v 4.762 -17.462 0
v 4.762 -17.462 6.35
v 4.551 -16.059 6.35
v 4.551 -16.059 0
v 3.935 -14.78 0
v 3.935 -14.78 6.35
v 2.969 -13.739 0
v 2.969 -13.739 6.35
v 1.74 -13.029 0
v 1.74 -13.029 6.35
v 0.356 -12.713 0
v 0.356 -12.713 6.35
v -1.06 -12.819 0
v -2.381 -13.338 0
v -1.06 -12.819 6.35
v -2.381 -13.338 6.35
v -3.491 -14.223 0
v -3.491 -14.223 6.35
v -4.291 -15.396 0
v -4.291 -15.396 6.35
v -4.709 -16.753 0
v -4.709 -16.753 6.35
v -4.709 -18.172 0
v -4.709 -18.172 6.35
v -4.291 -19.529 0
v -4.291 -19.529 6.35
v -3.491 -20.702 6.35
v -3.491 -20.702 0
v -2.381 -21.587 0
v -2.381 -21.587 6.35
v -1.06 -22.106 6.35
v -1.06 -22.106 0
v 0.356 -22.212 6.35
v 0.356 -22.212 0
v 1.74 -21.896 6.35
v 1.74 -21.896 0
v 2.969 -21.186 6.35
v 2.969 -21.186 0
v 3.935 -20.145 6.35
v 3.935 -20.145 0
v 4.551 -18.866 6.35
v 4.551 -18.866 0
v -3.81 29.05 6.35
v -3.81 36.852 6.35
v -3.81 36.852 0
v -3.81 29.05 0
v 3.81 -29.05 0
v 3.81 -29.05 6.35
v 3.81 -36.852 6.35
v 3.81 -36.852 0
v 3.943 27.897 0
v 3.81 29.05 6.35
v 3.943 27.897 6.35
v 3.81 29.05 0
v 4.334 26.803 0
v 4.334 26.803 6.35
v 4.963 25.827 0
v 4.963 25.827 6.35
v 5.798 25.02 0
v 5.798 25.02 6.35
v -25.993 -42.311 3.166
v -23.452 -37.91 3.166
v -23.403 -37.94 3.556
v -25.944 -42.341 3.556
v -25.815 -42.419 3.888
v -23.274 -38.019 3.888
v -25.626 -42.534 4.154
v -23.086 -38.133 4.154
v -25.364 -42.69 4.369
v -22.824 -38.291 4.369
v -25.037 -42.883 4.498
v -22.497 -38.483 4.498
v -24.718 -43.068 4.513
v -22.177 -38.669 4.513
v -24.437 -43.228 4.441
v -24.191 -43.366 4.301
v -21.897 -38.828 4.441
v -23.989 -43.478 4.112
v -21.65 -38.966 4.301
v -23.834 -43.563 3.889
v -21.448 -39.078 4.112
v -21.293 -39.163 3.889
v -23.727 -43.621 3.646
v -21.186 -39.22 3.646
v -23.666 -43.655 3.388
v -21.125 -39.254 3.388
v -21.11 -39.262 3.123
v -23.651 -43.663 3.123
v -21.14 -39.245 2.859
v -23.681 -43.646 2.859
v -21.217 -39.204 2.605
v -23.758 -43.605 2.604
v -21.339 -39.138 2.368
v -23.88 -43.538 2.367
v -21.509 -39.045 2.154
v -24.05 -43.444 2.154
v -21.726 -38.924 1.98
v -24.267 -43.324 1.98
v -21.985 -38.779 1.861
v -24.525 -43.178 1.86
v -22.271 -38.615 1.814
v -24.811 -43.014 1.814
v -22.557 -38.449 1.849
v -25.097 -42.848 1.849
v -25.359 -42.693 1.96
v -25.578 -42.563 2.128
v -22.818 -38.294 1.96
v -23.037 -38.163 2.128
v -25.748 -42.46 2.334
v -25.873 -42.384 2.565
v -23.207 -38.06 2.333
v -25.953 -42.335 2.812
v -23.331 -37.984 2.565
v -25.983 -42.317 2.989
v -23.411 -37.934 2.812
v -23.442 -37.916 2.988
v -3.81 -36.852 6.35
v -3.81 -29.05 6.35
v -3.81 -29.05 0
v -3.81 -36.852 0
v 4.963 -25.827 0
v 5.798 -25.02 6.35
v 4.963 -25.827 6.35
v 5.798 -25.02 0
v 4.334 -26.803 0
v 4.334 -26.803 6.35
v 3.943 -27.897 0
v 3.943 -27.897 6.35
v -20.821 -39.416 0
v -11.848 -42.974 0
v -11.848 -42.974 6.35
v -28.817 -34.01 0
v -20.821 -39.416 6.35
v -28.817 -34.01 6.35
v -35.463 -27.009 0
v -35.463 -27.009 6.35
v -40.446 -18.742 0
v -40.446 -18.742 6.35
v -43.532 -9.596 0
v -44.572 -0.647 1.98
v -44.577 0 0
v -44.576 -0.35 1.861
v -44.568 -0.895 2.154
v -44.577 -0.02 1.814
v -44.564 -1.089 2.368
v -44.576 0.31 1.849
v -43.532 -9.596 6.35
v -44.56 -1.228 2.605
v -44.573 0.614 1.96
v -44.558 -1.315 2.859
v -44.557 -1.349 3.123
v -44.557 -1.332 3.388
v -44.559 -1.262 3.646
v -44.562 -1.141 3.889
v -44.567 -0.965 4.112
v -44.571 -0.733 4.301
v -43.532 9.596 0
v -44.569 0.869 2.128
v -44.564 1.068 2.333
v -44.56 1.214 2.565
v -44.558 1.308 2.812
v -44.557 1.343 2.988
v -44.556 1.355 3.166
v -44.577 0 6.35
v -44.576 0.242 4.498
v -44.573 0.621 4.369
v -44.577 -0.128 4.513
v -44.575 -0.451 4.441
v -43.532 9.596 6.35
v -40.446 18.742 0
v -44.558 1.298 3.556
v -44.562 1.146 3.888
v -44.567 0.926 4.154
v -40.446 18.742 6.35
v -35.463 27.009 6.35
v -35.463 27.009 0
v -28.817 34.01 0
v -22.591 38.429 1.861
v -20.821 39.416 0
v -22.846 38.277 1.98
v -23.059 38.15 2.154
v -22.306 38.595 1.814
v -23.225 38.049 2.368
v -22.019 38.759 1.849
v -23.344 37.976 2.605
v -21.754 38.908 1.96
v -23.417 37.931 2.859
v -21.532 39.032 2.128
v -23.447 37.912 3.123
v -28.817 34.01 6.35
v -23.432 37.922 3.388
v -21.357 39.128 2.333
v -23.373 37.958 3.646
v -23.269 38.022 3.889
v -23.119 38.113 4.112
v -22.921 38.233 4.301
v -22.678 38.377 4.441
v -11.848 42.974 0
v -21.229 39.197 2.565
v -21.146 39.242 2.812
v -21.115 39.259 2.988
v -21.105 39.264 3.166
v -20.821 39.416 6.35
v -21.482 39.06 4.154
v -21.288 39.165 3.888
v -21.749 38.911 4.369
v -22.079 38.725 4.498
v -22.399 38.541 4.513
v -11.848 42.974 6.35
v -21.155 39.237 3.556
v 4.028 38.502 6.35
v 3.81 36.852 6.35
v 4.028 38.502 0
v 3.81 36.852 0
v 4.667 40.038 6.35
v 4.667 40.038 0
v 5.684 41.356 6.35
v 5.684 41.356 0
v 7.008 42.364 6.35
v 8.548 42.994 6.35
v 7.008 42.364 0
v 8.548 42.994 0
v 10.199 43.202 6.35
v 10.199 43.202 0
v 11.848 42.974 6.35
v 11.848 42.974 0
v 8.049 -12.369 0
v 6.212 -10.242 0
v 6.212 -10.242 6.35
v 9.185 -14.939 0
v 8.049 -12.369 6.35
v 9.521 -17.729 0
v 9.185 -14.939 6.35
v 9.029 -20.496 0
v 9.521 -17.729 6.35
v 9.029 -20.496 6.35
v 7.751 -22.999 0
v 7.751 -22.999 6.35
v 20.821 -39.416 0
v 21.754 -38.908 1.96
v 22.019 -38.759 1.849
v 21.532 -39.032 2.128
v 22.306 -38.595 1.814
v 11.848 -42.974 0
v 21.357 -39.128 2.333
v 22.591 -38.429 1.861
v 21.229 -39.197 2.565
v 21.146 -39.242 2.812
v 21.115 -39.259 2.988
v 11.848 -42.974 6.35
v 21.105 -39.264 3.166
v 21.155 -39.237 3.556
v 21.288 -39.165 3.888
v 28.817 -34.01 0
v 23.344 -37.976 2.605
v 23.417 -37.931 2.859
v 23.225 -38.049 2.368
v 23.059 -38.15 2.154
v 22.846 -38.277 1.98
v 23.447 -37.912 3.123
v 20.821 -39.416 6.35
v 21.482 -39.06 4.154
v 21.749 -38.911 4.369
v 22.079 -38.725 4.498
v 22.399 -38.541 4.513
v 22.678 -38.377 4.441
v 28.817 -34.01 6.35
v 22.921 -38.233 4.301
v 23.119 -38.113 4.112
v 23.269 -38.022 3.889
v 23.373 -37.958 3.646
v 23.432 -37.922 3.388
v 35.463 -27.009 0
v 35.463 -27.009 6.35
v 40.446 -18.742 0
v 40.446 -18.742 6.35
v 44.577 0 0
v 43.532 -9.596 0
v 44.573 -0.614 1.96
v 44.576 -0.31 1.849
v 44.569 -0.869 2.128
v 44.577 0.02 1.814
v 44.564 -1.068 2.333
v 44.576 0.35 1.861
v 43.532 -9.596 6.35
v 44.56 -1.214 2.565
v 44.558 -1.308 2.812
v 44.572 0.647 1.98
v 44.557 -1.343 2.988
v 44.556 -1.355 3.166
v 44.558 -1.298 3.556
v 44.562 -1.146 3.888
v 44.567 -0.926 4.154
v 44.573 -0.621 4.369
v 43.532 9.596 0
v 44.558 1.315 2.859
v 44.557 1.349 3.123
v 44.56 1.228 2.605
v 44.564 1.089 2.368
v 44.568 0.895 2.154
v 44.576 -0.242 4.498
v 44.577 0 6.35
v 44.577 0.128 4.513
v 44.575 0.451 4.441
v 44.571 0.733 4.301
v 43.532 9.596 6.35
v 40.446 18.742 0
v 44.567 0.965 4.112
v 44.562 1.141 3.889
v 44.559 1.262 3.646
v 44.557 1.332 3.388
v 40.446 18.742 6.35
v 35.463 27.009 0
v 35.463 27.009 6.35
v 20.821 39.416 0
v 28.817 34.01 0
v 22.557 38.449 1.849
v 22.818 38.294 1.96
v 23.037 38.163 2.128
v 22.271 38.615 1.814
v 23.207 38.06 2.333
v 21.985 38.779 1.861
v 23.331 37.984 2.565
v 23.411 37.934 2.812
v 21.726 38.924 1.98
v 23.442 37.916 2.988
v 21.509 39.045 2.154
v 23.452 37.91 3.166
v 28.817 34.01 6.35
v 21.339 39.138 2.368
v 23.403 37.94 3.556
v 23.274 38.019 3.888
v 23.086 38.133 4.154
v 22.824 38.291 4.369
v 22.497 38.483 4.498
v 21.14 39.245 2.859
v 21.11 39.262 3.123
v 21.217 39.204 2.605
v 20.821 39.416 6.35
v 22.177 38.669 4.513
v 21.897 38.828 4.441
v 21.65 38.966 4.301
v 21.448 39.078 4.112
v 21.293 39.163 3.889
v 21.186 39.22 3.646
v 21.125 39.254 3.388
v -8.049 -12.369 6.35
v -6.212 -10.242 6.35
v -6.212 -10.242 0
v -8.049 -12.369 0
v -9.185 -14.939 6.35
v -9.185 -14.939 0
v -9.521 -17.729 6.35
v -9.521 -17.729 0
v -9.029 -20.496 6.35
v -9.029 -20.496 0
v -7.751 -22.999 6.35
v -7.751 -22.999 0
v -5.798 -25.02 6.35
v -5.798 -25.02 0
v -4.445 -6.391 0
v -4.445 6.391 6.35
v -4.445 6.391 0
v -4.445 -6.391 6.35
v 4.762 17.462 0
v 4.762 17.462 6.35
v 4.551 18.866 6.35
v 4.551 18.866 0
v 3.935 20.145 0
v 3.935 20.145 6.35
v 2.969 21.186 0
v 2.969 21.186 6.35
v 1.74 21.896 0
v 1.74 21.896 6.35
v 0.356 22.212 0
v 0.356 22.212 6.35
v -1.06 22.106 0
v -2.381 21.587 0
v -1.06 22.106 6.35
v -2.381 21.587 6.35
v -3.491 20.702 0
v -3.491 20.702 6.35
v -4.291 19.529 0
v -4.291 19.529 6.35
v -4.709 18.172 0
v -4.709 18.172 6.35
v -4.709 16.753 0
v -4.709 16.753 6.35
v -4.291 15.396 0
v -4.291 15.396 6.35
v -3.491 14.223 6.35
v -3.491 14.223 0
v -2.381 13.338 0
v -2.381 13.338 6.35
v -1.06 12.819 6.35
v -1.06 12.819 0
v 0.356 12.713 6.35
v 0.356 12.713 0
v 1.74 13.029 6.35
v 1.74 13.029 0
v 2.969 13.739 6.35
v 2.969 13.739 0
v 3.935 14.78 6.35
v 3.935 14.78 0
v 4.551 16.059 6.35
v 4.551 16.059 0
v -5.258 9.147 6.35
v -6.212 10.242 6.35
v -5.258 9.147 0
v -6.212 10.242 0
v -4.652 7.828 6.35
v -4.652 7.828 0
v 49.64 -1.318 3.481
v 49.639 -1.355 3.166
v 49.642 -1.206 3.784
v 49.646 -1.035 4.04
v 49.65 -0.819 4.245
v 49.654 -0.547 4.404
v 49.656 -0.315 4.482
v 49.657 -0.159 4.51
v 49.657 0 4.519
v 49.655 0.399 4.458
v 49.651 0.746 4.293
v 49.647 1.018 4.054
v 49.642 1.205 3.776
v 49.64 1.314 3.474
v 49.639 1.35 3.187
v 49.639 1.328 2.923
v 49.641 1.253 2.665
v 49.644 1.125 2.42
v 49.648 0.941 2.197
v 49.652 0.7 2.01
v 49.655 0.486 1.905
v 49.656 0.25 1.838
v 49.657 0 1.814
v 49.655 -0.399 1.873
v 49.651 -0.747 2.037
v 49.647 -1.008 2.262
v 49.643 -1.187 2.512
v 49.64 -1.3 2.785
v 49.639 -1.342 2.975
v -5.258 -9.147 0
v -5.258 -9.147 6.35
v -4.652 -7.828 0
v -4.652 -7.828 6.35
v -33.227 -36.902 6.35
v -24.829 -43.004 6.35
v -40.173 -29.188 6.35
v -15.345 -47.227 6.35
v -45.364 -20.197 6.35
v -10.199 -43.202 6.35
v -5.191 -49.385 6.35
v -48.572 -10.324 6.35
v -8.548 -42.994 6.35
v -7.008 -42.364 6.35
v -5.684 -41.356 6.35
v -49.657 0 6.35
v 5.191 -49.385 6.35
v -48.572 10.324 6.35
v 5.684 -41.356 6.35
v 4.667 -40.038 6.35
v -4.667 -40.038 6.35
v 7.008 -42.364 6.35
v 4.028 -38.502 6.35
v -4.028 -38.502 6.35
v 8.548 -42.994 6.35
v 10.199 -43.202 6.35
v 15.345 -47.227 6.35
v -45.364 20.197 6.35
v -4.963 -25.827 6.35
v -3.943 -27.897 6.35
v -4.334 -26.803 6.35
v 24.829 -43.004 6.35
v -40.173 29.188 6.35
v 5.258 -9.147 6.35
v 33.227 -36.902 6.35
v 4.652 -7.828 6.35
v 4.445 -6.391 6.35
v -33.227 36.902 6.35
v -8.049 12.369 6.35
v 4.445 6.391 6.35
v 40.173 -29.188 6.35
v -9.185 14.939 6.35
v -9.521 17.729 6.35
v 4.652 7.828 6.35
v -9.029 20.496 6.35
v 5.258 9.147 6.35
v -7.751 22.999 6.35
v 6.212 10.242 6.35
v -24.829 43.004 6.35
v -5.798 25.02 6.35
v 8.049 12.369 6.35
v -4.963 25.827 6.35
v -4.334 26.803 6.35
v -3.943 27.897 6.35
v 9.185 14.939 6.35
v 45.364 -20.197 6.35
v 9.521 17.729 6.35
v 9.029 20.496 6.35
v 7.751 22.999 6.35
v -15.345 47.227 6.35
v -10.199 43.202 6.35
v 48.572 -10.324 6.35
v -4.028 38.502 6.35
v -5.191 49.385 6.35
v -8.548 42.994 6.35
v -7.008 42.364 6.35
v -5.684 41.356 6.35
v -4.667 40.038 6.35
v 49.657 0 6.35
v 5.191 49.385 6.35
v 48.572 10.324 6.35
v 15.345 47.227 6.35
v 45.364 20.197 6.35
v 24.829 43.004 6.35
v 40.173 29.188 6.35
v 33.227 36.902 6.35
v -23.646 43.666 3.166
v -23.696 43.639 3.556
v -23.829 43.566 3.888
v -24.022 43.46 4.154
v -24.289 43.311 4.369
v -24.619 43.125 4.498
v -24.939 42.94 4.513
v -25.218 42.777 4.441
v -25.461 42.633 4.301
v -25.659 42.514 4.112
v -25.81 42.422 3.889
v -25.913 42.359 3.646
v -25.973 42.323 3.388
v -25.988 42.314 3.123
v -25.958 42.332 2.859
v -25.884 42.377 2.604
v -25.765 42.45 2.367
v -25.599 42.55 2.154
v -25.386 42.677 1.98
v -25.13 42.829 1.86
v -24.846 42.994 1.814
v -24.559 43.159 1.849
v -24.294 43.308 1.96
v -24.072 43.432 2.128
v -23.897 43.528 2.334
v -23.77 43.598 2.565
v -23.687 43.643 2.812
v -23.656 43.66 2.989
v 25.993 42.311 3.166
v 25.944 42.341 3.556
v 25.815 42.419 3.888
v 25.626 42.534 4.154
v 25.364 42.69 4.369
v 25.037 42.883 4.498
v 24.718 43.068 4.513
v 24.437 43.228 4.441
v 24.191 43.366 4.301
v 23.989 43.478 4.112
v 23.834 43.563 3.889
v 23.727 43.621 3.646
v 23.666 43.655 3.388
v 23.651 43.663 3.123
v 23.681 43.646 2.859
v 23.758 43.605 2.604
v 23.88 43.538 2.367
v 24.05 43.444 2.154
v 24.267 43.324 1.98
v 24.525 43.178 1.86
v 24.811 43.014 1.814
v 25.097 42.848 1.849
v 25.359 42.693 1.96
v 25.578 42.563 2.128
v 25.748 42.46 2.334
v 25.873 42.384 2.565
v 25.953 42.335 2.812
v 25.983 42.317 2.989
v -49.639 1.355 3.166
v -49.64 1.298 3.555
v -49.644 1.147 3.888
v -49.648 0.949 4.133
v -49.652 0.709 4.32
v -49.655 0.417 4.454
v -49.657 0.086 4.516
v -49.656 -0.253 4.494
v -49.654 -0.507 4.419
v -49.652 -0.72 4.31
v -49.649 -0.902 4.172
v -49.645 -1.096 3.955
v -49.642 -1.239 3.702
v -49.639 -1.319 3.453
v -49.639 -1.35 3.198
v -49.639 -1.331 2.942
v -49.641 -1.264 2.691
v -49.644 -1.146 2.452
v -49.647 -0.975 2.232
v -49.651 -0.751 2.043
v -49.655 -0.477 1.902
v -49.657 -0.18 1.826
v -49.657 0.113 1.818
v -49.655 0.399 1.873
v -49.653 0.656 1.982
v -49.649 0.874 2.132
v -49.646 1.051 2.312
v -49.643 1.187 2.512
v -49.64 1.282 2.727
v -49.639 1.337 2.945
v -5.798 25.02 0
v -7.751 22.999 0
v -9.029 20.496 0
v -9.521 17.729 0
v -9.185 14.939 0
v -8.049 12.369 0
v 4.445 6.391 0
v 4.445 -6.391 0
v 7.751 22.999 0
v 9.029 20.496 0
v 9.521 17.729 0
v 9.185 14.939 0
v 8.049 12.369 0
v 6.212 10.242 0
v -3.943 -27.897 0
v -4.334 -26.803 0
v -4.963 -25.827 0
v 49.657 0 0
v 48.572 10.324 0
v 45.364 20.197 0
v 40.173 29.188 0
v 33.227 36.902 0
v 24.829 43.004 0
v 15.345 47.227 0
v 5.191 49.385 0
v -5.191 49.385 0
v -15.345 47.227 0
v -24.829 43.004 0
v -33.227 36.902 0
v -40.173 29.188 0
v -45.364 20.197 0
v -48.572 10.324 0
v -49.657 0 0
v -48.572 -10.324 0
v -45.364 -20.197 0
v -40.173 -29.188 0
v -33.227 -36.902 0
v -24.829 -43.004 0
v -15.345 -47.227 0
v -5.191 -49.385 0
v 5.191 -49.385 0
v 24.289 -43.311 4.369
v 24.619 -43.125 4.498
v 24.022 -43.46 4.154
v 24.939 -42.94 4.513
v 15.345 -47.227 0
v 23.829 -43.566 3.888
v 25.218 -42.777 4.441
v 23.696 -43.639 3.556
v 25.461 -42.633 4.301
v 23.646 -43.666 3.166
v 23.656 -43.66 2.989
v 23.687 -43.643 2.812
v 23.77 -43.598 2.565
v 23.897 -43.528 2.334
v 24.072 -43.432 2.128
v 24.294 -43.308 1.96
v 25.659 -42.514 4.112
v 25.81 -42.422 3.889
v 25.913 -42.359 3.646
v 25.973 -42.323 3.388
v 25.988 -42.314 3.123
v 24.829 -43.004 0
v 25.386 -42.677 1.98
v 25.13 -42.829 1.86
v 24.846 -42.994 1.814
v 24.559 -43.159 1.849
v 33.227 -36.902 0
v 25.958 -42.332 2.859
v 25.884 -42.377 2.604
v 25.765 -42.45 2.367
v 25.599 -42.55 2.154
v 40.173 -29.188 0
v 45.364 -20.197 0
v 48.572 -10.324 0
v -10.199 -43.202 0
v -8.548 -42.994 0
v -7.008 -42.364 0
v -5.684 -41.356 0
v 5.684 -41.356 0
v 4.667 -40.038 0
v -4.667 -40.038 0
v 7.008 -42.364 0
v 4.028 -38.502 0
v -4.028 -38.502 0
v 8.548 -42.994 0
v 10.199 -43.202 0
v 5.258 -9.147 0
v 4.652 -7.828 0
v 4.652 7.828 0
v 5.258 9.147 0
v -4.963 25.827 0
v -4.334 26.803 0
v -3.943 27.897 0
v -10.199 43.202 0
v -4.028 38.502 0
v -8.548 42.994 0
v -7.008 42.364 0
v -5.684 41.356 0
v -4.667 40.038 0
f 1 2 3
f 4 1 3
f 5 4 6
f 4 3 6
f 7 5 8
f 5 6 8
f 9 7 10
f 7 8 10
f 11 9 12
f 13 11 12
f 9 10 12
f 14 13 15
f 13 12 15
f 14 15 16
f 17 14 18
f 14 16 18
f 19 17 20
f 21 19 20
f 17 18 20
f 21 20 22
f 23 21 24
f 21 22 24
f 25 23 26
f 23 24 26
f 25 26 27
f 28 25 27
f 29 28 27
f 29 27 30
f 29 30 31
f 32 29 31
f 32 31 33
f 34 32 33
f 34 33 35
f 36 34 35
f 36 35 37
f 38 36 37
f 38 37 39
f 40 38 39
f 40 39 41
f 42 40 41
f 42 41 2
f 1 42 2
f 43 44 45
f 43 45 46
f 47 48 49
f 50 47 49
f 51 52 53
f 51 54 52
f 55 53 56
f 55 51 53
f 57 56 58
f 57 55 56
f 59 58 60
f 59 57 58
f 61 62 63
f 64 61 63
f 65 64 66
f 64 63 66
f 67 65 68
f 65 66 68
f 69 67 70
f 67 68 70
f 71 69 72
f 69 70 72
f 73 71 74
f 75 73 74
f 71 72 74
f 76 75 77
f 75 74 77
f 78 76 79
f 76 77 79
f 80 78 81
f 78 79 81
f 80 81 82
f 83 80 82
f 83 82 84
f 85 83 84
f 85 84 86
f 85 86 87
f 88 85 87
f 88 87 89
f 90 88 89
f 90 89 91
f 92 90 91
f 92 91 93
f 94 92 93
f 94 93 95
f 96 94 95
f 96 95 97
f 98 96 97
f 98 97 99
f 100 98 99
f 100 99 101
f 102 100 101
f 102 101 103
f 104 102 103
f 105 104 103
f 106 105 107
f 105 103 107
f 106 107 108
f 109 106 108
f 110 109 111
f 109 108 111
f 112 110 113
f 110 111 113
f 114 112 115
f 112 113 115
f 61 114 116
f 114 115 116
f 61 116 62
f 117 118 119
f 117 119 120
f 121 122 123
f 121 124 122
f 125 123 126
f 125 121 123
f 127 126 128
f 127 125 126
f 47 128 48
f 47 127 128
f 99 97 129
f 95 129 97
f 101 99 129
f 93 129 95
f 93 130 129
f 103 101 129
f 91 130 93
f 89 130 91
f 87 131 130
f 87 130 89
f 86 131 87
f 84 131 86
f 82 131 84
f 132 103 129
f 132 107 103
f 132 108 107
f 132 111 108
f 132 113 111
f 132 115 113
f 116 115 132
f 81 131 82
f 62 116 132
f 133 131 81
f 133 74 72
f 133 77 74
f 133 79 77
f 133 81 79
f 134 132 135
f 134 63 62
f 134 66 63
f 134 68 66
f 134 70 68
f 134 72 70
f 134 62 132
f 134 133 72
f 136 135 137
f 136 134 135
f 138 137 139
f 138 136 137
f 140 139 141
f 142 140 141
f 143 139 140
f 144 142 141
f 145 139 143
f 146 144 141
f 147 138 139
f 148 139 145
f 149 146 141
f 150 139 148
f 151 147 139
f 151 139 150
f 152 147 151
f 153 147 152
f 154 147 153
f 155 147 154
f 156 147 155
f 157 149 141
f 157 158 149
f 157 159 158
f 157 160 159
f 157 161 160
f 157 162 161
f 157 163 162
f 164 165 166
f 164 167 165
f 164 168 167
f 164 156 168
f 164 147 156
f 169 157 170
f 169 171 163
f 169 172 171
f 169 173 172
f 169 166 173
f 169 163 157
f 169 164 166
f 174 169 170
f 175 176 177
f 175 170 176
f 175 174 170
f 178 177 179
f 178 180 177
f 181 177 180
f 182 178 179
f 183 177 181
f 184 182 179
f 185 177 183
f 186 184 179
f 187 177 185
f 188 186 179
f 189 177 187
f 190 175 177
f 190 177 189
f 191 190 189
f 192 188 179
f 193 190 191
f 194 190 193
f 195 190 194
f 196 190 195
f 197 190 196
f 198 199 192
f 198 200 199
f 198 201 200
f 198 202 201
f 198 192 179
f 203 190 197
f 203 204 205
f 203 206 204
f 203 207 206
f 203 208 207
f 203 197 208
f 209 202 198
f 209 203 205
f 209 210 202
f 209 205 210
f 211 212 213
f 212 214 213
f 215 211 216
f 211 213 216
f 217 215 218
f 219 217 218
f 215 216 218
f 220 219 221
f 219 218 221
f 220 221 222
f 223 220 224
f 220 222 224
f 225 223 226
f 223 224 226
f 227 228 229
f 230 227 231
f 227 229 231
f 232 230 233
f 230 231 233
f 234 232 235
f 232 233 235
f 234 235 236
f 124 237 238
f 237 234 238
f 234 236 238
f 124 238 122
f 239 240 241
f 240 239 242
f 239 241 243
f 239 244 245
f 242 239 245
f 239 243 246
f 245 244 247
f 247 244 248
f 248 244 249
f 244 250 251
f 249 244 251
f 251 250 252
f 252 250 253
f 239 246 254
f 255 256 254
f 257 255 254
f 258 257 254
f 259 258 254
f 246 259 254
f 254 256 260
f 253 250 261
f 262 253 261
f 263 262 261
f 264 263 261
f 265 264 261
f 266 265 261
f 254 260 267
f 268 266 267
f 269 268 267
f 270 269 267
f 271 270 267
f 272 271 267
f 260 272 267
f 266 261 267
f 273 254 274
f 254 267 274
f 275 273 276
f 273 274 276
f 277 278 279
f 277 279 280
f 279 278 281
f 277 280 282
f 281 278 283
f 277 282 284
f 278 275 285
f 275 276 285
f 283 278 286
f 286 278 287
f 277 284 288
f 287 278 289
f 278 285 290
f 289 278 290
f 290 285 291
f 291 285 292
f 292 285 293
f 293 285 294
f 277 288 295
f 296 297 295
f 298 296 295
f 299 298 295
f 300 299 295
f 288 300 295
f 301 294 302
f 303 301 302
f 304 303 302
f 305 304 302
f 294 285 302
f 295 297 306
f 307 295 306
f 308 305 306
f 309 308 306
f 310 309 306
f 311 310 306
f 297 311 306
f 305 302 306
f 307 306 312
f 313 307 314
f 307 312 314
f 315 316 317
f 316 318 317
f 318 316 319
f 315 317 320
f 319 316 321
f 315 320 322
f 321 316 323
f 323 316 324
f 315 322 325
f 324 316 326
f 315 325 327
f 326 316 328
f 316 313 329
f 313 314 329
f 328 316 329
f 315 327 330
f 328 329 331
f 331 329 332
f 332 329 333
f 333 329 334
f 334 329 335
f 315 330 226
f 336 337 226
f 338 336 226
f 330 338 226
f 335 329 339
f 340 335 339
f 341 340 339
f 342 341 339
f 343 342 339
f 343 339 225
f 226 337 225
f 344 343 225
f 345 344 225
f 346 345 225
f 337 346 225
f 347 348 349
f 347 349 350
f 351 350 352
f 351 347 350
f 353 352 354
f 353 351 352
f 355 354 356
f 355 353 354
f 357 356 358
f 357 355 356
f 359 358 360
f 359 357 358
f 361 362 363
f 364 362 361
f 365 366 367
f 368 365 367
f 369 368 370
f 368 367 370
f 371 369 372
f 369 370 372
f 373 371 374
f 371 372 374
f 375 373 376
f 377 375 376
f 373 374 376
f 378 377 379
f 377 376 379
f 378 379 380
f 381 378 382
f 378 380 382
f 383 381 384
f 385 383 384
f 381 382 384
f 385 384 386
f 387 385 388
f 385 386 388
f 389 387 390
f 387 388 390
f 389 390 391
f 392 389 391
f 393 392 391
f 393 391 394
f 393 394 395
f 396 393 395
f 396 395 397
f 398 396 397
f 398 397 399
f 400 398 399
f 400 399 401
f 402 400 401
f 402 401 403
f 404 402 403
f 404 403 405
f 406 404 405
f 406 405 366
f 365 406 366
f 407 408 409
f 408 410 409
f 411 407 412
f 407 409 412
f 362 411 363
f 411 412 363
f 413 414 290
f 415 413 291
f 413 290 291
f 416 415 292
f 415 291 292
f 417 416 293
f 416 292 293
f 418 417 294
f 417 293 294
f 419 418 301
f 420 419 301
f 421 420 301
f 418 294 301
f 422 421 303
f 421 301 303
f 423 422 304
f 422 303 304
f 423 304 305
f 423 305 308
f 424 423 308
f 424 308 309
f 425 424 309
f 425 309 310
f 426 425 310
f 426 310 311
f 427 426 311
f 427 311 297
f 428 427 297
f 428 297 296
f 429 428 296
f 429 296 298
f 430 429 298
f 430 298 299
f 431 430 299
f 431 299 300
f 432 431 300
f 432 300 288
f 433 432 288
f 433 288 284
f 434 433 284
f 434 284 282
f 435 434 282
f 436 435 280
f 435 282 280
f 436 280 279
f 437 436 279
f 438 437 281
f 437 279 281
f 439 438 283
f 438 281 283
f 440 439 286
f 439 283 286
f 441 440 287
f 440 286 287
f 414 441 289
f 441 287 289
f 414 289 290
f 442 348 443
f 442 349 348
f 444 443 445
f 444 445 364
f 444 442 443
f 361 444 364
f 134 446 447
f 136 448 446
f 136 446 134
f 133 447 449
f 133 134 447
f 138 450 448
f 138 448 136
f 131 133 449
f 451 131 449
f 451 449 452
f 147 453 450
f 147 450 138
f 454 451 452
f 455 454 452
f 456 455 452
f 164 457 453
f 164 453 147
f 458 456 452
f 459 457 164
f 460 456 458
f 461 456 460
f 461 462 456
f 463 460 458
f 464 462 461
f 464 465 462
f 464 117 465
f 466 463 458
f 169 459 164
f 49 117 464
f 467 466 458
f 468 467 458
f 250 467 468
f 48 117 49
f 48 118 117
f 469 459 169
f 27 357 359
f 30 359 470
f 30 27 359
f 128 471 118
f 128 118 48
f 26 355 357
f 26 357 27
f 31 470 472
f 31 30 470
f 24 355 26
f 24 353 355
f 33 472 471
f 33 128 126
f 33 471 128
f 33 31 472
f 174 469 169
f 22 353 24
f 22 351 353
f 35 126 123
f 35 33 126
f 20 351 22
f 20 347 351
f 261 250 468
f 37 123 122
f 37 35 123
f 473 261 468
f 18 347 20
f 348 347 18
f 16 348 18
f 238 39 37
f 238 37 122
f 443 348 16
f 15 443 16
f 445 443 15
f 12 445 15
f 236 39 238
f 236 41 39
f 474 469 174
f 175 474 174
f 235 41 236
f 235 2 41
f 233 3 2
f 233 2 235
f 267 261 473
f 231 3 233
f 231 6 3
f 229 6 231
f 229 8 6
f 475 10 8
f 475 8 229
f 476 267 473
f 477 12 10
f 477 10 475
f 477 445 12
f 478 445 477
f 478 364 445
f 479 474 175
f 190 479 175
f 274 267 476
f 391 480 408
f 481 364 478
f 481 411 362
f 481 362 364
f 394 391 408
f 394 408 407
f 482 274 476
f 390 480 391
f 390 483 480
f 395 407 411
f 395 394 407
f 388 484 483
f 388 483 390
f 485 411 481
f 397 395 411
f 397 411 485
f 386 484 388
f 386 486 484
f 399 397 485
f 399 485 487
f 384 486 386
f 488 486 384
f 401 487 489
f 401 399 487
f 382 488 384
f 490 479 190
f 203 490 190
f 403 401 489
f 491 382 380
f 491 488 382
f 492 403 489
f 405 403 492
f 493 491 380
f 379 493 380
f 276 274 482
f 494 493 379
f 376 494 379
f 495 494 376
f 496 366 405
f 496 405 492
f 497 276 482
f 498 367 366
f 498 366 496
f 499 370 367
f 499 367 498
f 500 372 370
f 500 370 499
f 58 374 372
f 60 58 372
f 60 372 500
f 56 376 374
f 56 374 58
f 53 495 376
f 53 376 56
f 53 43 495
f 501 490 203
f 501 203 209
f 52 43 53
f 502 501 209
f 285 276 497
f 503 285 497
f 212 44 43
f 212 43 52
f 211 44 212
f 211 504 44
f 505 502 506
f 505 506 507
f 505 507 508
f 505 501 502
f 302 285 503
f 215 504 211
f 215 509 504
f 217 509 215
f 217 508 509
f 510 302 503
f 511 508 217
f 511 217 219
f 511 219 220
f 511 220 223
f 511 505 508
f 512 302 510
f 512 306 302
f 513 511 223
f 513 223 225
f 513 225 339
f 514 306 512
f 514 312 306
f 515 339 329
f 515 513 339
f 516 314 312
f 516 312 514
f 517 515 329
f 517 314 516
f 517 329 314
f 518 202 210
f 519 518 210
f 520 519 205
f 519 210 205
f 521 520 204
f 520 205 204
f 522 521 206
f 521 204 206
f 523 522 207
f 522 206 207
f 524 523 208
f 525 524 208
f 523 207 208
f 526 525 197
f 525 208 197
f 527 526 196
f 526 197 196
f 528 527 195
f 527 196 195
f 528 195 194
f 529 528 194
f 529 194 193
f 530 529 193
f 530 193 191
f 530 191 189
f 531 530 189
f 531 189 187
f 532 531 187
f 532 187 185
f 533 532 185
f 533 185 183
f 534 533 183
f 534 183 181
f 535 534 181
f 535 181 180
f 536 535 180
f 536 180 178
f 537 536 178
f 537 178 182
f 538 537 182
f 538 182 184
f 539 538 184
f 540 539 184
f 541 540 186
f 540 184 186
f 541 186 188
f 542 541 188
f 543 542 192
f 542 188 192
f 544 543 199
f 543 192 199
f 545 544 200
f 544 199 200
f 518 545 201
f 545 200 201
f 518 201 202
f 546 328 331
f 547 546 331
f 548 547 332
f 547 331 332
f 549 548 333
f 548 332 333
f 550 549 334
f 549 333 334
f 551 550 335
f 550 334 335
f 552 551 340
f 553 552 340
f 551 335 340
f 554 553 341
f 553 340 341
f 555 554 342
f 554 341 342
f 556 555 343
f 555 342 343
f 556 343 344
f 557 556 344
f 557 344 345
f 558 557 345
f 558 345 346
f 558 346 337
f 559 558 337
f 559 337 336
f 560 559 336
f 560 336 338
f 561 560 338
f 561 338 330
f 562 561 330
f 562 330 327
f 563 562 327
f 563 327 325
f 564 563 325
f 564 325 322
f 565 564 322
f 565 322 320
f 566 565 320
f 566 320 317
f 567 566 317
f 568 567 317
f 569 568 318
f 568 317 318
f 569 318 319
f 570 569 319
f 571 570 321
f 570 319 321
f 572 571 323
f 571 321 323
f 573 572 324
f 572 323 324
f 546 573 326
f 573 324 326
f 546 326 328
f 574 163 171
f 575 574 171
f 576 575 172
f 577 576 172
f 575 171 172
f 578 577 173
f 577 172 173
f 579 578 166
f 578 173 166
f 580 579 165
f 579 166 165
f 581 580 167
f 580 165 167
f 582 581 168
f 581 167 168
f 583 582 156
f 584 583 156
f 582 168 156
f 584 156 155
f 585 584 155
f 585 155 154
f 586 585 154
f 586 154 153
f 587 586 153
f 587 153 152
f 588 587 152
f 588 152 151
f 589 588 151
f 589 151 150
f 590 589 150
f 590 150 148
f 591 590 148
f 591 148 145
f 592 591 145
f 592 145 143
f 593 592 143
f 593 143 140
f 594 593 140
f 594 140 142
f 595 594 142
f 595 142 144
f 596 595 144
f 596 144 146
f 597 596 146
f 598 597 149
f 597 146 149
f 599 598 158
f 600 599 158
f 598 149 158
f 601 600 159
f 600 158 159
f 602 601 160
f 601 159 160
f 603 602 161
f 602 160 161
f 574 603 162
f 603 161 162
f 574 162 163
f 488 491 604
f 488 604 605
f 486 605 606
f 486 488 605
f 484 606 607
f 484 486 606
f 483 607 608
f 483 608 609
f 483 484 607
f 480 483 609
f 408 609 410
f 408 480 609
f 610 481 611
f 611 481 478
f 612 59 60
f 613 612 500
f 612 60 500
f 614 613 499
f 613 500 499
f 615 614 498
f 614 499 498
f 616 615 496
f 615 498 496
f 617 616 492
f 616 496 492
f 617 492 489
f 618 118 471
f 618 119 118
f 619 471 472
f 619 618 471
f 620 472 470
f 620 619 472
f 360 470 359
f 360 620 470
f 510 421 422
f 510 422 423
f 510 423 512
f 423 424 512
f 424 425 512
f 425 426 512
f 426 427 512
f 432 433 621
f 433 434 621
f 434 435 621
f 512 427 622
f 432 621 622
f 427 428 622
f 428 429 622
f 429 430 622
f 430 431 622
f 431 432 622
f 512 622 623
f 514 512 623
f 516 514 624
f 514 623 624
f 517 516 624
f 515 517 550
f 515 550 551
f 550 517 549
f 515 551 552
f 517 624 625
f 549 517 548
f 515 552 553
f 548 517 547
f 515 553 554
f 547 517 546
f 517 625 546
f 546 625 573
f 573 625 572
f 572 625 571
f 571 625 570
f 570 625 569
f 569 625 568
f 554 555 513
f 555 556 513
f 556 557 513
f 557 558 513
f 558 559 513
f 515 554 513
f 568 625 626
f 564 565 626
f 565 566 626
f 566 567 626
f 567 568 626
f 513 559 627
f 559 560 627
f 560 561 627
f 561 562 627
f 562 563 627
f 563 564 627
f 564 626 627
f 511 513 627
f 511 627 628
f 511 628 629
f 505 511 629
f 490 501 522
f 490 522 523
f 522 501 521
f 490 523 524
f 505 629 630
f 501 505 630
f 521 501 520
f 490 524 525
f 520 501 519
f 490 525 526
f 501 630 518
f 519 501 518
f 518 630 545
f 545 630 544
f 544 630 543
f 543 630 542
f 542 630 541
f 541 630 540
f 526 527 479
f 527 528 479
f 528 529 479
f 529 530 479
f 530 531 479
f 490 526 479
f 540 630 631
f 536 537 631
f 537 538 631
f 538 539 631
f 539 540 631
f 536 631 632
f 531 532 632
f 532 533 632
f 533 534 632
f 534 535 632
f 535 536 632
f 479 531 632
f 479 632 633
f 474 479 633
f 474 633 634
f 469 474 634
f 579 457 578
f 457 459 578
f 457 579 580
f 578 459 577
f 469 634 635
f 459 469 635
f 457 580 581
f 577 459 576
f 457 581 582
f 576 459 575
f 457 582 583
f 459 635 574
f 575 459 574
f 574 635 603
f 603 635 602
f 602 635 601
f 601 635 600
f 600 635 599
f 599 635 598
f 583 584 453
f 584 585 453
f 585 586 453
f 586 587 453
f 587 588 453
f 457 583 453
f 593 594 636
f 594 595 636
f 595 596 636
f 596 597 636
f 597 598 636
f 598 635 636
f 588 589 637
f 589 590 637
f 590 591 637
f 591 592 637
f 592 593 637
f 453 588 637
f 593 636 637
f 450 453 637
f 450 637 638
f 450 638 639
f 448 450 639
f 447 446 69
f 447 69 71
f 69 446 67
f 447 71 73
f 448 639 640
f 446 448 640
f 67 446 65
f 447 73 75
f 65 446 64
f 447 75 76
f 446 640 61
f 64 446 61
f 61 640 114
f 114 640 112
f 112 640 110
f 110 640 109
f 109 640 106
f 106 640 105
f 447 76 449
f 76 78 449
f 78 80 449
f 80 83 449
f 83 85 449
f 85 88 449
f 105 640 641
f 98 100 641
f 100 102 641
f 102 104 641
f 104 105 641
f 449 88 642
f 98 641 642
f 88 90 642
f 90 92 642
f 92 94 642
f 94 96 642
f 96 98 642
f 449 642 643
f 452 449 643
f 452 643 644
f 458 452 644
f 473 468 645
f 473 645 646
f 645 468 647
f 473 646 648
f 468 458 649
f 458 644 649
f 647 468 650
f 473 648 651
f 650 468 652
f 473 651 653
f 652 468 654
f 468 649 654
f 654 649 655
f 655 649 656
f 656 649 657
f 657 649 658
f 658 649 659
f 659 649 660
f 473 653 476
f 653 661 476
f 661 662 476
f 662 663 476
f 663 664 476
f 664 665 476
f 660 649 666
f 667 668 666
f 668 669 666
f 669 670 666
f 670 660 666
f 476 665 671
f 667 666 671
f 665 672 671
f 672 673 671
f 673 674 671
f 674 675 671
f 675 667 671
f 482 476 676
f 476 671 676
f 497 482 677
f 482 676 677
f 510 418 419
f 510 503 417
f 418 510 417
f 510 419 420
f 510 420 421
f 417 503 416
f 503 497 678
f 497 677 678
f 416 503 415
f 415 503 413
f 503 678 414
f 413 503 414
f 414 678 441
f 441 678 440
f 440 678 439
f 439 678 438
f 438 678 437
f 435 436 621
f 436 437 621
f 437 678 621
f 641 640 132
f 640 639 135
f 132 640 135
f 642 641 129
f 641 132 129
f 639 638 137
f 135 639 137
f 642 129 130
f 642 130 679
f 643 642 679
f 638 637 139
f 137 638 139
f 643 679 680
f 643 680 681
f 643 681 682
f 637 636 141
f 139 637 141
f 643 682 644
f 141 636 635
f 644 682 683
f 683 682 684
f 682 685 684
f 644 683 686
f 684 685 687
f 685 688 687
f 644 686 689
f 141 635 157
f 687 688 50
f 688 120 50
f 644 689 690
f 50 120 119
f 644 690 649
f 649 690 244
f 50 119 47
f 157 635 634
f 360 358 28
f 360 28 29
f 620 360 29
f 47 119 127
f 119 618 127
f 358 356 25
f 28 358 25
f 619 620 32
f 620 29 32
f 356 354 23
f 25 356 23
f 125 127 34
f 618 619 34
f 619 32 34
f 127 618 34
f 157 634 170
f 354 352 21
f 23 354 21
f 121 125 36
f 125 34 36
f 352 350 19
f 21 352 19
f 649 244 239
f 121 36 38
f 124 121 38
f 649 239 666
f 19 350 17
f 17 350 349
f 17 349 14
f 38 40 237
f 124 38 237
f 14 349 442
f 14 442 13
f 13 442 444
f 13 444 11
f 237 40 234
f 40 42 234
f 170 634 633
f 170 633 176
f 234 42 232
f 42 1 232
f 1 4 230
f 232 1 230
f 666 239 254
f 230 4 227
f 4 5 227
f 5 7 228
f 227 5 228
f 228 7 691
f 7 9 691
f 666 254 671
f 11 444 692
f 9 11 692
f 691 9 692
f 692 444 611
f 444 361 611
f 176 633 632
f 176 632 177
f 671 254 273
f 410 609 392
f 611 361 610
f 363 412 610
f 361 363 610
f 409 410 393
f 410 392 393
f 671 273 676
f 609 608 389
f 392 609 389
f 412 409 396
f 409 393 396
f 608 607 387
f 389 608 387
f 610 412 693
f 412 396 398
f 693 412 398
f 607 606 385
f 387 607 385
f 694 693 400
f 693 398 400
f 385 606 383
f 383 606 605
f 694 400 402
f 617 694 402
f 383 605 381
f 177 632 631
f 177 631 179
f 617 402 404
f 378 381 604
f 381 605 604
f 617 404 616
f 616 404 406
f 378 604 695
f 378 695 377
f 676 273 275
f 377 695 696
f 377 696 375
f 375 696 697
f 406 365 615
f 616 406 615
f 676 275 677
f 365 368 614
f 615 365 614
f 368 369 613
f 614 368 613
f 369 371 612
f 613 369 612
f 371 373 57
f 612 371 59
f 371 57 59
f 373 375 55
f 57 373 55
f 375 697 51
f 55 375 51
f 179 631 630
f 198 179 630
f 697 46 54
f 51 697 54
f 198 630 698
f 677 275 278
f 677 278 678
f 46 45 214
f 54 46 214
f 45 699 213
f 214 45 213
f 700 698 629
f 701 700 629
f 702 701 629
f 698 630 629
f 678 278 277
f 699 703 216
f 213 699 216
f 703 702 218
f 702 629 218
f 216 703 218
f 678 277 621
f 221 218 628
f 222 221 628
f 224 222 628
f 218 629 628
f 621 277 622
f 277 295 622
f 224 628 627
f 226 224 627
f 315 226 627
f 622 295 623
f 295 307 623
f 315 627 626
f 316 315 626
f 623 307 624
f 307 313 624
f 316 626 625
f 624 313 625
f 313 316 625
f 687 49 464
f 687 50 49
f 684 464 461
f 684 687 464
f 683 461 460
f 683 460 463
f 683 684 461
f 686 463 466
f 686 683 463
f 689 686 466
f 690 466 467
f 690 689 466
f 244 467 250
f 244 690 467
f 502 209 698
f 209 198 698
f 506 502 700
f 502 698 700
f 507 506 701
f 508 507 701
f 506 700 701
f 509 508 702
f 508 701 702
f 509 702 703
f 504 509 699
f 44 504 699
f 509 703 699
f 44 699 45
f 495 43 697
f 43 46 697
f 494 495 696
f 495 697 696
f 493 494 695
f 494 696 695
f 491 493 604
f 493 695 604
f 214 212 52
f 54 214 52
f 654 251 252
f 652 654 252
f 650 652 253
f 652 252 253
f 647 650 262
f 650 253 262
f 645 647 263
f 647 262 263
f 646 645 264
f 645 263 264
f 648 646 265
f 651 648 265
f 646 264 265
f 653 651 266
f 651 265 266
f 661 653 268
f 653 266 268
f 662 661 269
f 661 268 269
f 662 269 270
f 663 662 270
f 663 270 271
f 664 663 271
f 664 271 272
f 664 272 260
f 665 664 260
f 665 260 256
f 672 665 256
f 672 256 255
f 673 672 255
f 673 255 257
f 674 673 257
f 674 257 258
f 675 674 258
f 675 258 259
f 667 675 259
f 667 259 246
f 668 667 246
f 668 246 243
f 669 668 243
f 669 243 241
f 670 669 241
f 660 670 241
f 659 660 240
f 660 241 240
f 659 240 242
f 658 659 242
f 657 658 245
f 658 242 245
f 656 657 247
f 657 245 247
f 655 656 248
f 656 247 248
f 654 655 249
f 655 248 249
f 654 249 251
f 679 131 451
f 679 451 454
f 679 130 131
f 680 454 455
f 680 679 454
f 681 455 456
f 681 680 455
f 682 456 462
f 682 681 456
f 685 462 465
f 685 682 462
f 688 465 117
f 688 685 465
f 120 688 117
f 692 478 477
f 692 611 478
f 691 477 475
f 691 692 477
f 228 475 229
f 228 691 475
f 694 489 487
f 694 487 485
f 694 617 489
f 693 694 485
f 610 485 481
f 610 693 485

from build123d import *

# Parameters (mm, degrees)
SKETCH1_R                 = 49.657
BOSS_EXTRUDE1_DEPTH       = 6.35
CUT_EXTRUDE1_DEPTH        = 71.512111002
FILLET1_R                 = 6.35
FILLET2_R                 = 5.08
SKETCH4_R                 = 4.7625
CUT_EXTRUDE2_DEPTH        = 71.512111002
F_6_32_TAPPED_HOLE1_D     = 2.7051
F_6_32_TAPPED_HOLE1_DEPTH = 12.7
CIRPATTERN1_COUNT         = 6


with BuildPart() as part:
    # Sketch1 → Boss-Extrude1 (new body)
    with BuildSketch(Plane.XY):
        Circle(SKETCH1_R)
    extrude(amount=BOSS_EXTRUDE1_DEPTH)

    # Sketch3 → Cut-Extrude1 (cut, through all)
    with BuildSketch(Plane.XY.offset(6.35)):
        with BuildLine():
            Line((-3.81, 44.41388104), (-3.81, 26.192306699))
            ThreePointArc((-3.81, 26.192306699), (-9.518480656, 17.814850668), (-4.445, 9.038273032))
            Line((-4.445, 9.038273032), (-4.445, -9.038273032))
            ThreePointArc((-4.445, -9.038273032), (-9.518480656, -17.814850668), (-3.81, -26.192306699))
            Line((-3.81, -26.192306699), (-3.81, -44.41388104))
            ThreePointArc((-3.81, -44.41388104), (-44.577, 0), (-3.81, 44.41388104))
        make_face()
        with BuildLine():
            Line((3.81, 44.41388104), (3.81, 26.192306699))
            ThreePointArc((3.81, 26.192306699), (9.518480656, 17.814850668), (4.445, 9.038273032))
            Line((4.445, 9.038273032), (4.445, -9.038273032))
            ThreePointArc((4.445, -9.038273032), (9.518480656, -17.814850668), (3.81, -26.192306699))
            Line((3.81, -26.192306699), (3.81, -44.41388104))
            ThreePointArc((3.81, -44.41388104), (44.577, 0), (3.81, 44.41388104))
        make_face()
    extrude(amount=-CUT_EXTRUDE1_DEPTH, mode=Mode.SUBTRACT)

    # Fillet1
    fillet1_edges = [part.edges().sort_by_distance(p)[0] for p in [
        (-3.81, 44.41388104, 3.175),
        (-3.81, -44.41388104, 3.175),
        (3.81, 44.41388104, 3.175),
        (3.81, -44.41388104, 3.175),
    ]]
    fillet(fillet1_edges, radius=FILLET1_R)

    # Fillet2
    fillet2_edges = [part.edges().sort_by_distance(p)[0] for p in [
        (-3.81, 26.192306699, 3.175),
        (-4.445, 9.038273032, 3.175),
        (-4.445, -9.038273032, 3.175),
        (-3.81, -26.192306699, 3.175),
        (4.445, 9.038273032, 3.175),
        (3.81, 26.192306699, 3.175),
        (3.81, -26.192306699, 3.175),
        (4.445, -9.038273032, 3.175),
    ]]
    fillet(fillet2_edges, radius=FILLET2_R)

    # Sketch4 → Cut-Extrude2 (cut, through all)
    with BuildSketch(Plane.XY.offset(6.35)):
        with Locations((0, 17.4625)):
            Circle(SKETCH4_R)
        with Locations((0, -17.4625)):
            Circle(SKETCH4_R)
    extrude(amount=-CUT_EXTRUDE2_DEPTH, mode=Mode.SUBTRACT)

    # #6-32 Tapped Hole1
    with Locations(Plane(origin=(49.65699993, -0.002635703, 3.166396975), x_dir=(5.3078169e-05, 0.999999998591, 0), z_dir=(0.999999998591, -5.3078169e-05, 0))):
        with Locations((0, 0)):
            f_6_32_tapped_hole1 = Hole(F_6_32_TAPPED_HOLE1_D / 2, depth=F_6_32_TAPPED_HOLE1_DEPTH)

    # CirPattern1: #6-32 Tapped Hole1 ×6 about axis
    cirpattern1_axis = Axis((0, 0, 6.35), (0, 0, -1))
    for i in range(1, CIRPATTERN1_COUNT):
        add(f_6_32_tapped_hole1.rotate(cirpattern1_axis, i * 360 / CIRPATTERN1_COUNT), mode=Mode.SUBTRACT)


solid = part.part
